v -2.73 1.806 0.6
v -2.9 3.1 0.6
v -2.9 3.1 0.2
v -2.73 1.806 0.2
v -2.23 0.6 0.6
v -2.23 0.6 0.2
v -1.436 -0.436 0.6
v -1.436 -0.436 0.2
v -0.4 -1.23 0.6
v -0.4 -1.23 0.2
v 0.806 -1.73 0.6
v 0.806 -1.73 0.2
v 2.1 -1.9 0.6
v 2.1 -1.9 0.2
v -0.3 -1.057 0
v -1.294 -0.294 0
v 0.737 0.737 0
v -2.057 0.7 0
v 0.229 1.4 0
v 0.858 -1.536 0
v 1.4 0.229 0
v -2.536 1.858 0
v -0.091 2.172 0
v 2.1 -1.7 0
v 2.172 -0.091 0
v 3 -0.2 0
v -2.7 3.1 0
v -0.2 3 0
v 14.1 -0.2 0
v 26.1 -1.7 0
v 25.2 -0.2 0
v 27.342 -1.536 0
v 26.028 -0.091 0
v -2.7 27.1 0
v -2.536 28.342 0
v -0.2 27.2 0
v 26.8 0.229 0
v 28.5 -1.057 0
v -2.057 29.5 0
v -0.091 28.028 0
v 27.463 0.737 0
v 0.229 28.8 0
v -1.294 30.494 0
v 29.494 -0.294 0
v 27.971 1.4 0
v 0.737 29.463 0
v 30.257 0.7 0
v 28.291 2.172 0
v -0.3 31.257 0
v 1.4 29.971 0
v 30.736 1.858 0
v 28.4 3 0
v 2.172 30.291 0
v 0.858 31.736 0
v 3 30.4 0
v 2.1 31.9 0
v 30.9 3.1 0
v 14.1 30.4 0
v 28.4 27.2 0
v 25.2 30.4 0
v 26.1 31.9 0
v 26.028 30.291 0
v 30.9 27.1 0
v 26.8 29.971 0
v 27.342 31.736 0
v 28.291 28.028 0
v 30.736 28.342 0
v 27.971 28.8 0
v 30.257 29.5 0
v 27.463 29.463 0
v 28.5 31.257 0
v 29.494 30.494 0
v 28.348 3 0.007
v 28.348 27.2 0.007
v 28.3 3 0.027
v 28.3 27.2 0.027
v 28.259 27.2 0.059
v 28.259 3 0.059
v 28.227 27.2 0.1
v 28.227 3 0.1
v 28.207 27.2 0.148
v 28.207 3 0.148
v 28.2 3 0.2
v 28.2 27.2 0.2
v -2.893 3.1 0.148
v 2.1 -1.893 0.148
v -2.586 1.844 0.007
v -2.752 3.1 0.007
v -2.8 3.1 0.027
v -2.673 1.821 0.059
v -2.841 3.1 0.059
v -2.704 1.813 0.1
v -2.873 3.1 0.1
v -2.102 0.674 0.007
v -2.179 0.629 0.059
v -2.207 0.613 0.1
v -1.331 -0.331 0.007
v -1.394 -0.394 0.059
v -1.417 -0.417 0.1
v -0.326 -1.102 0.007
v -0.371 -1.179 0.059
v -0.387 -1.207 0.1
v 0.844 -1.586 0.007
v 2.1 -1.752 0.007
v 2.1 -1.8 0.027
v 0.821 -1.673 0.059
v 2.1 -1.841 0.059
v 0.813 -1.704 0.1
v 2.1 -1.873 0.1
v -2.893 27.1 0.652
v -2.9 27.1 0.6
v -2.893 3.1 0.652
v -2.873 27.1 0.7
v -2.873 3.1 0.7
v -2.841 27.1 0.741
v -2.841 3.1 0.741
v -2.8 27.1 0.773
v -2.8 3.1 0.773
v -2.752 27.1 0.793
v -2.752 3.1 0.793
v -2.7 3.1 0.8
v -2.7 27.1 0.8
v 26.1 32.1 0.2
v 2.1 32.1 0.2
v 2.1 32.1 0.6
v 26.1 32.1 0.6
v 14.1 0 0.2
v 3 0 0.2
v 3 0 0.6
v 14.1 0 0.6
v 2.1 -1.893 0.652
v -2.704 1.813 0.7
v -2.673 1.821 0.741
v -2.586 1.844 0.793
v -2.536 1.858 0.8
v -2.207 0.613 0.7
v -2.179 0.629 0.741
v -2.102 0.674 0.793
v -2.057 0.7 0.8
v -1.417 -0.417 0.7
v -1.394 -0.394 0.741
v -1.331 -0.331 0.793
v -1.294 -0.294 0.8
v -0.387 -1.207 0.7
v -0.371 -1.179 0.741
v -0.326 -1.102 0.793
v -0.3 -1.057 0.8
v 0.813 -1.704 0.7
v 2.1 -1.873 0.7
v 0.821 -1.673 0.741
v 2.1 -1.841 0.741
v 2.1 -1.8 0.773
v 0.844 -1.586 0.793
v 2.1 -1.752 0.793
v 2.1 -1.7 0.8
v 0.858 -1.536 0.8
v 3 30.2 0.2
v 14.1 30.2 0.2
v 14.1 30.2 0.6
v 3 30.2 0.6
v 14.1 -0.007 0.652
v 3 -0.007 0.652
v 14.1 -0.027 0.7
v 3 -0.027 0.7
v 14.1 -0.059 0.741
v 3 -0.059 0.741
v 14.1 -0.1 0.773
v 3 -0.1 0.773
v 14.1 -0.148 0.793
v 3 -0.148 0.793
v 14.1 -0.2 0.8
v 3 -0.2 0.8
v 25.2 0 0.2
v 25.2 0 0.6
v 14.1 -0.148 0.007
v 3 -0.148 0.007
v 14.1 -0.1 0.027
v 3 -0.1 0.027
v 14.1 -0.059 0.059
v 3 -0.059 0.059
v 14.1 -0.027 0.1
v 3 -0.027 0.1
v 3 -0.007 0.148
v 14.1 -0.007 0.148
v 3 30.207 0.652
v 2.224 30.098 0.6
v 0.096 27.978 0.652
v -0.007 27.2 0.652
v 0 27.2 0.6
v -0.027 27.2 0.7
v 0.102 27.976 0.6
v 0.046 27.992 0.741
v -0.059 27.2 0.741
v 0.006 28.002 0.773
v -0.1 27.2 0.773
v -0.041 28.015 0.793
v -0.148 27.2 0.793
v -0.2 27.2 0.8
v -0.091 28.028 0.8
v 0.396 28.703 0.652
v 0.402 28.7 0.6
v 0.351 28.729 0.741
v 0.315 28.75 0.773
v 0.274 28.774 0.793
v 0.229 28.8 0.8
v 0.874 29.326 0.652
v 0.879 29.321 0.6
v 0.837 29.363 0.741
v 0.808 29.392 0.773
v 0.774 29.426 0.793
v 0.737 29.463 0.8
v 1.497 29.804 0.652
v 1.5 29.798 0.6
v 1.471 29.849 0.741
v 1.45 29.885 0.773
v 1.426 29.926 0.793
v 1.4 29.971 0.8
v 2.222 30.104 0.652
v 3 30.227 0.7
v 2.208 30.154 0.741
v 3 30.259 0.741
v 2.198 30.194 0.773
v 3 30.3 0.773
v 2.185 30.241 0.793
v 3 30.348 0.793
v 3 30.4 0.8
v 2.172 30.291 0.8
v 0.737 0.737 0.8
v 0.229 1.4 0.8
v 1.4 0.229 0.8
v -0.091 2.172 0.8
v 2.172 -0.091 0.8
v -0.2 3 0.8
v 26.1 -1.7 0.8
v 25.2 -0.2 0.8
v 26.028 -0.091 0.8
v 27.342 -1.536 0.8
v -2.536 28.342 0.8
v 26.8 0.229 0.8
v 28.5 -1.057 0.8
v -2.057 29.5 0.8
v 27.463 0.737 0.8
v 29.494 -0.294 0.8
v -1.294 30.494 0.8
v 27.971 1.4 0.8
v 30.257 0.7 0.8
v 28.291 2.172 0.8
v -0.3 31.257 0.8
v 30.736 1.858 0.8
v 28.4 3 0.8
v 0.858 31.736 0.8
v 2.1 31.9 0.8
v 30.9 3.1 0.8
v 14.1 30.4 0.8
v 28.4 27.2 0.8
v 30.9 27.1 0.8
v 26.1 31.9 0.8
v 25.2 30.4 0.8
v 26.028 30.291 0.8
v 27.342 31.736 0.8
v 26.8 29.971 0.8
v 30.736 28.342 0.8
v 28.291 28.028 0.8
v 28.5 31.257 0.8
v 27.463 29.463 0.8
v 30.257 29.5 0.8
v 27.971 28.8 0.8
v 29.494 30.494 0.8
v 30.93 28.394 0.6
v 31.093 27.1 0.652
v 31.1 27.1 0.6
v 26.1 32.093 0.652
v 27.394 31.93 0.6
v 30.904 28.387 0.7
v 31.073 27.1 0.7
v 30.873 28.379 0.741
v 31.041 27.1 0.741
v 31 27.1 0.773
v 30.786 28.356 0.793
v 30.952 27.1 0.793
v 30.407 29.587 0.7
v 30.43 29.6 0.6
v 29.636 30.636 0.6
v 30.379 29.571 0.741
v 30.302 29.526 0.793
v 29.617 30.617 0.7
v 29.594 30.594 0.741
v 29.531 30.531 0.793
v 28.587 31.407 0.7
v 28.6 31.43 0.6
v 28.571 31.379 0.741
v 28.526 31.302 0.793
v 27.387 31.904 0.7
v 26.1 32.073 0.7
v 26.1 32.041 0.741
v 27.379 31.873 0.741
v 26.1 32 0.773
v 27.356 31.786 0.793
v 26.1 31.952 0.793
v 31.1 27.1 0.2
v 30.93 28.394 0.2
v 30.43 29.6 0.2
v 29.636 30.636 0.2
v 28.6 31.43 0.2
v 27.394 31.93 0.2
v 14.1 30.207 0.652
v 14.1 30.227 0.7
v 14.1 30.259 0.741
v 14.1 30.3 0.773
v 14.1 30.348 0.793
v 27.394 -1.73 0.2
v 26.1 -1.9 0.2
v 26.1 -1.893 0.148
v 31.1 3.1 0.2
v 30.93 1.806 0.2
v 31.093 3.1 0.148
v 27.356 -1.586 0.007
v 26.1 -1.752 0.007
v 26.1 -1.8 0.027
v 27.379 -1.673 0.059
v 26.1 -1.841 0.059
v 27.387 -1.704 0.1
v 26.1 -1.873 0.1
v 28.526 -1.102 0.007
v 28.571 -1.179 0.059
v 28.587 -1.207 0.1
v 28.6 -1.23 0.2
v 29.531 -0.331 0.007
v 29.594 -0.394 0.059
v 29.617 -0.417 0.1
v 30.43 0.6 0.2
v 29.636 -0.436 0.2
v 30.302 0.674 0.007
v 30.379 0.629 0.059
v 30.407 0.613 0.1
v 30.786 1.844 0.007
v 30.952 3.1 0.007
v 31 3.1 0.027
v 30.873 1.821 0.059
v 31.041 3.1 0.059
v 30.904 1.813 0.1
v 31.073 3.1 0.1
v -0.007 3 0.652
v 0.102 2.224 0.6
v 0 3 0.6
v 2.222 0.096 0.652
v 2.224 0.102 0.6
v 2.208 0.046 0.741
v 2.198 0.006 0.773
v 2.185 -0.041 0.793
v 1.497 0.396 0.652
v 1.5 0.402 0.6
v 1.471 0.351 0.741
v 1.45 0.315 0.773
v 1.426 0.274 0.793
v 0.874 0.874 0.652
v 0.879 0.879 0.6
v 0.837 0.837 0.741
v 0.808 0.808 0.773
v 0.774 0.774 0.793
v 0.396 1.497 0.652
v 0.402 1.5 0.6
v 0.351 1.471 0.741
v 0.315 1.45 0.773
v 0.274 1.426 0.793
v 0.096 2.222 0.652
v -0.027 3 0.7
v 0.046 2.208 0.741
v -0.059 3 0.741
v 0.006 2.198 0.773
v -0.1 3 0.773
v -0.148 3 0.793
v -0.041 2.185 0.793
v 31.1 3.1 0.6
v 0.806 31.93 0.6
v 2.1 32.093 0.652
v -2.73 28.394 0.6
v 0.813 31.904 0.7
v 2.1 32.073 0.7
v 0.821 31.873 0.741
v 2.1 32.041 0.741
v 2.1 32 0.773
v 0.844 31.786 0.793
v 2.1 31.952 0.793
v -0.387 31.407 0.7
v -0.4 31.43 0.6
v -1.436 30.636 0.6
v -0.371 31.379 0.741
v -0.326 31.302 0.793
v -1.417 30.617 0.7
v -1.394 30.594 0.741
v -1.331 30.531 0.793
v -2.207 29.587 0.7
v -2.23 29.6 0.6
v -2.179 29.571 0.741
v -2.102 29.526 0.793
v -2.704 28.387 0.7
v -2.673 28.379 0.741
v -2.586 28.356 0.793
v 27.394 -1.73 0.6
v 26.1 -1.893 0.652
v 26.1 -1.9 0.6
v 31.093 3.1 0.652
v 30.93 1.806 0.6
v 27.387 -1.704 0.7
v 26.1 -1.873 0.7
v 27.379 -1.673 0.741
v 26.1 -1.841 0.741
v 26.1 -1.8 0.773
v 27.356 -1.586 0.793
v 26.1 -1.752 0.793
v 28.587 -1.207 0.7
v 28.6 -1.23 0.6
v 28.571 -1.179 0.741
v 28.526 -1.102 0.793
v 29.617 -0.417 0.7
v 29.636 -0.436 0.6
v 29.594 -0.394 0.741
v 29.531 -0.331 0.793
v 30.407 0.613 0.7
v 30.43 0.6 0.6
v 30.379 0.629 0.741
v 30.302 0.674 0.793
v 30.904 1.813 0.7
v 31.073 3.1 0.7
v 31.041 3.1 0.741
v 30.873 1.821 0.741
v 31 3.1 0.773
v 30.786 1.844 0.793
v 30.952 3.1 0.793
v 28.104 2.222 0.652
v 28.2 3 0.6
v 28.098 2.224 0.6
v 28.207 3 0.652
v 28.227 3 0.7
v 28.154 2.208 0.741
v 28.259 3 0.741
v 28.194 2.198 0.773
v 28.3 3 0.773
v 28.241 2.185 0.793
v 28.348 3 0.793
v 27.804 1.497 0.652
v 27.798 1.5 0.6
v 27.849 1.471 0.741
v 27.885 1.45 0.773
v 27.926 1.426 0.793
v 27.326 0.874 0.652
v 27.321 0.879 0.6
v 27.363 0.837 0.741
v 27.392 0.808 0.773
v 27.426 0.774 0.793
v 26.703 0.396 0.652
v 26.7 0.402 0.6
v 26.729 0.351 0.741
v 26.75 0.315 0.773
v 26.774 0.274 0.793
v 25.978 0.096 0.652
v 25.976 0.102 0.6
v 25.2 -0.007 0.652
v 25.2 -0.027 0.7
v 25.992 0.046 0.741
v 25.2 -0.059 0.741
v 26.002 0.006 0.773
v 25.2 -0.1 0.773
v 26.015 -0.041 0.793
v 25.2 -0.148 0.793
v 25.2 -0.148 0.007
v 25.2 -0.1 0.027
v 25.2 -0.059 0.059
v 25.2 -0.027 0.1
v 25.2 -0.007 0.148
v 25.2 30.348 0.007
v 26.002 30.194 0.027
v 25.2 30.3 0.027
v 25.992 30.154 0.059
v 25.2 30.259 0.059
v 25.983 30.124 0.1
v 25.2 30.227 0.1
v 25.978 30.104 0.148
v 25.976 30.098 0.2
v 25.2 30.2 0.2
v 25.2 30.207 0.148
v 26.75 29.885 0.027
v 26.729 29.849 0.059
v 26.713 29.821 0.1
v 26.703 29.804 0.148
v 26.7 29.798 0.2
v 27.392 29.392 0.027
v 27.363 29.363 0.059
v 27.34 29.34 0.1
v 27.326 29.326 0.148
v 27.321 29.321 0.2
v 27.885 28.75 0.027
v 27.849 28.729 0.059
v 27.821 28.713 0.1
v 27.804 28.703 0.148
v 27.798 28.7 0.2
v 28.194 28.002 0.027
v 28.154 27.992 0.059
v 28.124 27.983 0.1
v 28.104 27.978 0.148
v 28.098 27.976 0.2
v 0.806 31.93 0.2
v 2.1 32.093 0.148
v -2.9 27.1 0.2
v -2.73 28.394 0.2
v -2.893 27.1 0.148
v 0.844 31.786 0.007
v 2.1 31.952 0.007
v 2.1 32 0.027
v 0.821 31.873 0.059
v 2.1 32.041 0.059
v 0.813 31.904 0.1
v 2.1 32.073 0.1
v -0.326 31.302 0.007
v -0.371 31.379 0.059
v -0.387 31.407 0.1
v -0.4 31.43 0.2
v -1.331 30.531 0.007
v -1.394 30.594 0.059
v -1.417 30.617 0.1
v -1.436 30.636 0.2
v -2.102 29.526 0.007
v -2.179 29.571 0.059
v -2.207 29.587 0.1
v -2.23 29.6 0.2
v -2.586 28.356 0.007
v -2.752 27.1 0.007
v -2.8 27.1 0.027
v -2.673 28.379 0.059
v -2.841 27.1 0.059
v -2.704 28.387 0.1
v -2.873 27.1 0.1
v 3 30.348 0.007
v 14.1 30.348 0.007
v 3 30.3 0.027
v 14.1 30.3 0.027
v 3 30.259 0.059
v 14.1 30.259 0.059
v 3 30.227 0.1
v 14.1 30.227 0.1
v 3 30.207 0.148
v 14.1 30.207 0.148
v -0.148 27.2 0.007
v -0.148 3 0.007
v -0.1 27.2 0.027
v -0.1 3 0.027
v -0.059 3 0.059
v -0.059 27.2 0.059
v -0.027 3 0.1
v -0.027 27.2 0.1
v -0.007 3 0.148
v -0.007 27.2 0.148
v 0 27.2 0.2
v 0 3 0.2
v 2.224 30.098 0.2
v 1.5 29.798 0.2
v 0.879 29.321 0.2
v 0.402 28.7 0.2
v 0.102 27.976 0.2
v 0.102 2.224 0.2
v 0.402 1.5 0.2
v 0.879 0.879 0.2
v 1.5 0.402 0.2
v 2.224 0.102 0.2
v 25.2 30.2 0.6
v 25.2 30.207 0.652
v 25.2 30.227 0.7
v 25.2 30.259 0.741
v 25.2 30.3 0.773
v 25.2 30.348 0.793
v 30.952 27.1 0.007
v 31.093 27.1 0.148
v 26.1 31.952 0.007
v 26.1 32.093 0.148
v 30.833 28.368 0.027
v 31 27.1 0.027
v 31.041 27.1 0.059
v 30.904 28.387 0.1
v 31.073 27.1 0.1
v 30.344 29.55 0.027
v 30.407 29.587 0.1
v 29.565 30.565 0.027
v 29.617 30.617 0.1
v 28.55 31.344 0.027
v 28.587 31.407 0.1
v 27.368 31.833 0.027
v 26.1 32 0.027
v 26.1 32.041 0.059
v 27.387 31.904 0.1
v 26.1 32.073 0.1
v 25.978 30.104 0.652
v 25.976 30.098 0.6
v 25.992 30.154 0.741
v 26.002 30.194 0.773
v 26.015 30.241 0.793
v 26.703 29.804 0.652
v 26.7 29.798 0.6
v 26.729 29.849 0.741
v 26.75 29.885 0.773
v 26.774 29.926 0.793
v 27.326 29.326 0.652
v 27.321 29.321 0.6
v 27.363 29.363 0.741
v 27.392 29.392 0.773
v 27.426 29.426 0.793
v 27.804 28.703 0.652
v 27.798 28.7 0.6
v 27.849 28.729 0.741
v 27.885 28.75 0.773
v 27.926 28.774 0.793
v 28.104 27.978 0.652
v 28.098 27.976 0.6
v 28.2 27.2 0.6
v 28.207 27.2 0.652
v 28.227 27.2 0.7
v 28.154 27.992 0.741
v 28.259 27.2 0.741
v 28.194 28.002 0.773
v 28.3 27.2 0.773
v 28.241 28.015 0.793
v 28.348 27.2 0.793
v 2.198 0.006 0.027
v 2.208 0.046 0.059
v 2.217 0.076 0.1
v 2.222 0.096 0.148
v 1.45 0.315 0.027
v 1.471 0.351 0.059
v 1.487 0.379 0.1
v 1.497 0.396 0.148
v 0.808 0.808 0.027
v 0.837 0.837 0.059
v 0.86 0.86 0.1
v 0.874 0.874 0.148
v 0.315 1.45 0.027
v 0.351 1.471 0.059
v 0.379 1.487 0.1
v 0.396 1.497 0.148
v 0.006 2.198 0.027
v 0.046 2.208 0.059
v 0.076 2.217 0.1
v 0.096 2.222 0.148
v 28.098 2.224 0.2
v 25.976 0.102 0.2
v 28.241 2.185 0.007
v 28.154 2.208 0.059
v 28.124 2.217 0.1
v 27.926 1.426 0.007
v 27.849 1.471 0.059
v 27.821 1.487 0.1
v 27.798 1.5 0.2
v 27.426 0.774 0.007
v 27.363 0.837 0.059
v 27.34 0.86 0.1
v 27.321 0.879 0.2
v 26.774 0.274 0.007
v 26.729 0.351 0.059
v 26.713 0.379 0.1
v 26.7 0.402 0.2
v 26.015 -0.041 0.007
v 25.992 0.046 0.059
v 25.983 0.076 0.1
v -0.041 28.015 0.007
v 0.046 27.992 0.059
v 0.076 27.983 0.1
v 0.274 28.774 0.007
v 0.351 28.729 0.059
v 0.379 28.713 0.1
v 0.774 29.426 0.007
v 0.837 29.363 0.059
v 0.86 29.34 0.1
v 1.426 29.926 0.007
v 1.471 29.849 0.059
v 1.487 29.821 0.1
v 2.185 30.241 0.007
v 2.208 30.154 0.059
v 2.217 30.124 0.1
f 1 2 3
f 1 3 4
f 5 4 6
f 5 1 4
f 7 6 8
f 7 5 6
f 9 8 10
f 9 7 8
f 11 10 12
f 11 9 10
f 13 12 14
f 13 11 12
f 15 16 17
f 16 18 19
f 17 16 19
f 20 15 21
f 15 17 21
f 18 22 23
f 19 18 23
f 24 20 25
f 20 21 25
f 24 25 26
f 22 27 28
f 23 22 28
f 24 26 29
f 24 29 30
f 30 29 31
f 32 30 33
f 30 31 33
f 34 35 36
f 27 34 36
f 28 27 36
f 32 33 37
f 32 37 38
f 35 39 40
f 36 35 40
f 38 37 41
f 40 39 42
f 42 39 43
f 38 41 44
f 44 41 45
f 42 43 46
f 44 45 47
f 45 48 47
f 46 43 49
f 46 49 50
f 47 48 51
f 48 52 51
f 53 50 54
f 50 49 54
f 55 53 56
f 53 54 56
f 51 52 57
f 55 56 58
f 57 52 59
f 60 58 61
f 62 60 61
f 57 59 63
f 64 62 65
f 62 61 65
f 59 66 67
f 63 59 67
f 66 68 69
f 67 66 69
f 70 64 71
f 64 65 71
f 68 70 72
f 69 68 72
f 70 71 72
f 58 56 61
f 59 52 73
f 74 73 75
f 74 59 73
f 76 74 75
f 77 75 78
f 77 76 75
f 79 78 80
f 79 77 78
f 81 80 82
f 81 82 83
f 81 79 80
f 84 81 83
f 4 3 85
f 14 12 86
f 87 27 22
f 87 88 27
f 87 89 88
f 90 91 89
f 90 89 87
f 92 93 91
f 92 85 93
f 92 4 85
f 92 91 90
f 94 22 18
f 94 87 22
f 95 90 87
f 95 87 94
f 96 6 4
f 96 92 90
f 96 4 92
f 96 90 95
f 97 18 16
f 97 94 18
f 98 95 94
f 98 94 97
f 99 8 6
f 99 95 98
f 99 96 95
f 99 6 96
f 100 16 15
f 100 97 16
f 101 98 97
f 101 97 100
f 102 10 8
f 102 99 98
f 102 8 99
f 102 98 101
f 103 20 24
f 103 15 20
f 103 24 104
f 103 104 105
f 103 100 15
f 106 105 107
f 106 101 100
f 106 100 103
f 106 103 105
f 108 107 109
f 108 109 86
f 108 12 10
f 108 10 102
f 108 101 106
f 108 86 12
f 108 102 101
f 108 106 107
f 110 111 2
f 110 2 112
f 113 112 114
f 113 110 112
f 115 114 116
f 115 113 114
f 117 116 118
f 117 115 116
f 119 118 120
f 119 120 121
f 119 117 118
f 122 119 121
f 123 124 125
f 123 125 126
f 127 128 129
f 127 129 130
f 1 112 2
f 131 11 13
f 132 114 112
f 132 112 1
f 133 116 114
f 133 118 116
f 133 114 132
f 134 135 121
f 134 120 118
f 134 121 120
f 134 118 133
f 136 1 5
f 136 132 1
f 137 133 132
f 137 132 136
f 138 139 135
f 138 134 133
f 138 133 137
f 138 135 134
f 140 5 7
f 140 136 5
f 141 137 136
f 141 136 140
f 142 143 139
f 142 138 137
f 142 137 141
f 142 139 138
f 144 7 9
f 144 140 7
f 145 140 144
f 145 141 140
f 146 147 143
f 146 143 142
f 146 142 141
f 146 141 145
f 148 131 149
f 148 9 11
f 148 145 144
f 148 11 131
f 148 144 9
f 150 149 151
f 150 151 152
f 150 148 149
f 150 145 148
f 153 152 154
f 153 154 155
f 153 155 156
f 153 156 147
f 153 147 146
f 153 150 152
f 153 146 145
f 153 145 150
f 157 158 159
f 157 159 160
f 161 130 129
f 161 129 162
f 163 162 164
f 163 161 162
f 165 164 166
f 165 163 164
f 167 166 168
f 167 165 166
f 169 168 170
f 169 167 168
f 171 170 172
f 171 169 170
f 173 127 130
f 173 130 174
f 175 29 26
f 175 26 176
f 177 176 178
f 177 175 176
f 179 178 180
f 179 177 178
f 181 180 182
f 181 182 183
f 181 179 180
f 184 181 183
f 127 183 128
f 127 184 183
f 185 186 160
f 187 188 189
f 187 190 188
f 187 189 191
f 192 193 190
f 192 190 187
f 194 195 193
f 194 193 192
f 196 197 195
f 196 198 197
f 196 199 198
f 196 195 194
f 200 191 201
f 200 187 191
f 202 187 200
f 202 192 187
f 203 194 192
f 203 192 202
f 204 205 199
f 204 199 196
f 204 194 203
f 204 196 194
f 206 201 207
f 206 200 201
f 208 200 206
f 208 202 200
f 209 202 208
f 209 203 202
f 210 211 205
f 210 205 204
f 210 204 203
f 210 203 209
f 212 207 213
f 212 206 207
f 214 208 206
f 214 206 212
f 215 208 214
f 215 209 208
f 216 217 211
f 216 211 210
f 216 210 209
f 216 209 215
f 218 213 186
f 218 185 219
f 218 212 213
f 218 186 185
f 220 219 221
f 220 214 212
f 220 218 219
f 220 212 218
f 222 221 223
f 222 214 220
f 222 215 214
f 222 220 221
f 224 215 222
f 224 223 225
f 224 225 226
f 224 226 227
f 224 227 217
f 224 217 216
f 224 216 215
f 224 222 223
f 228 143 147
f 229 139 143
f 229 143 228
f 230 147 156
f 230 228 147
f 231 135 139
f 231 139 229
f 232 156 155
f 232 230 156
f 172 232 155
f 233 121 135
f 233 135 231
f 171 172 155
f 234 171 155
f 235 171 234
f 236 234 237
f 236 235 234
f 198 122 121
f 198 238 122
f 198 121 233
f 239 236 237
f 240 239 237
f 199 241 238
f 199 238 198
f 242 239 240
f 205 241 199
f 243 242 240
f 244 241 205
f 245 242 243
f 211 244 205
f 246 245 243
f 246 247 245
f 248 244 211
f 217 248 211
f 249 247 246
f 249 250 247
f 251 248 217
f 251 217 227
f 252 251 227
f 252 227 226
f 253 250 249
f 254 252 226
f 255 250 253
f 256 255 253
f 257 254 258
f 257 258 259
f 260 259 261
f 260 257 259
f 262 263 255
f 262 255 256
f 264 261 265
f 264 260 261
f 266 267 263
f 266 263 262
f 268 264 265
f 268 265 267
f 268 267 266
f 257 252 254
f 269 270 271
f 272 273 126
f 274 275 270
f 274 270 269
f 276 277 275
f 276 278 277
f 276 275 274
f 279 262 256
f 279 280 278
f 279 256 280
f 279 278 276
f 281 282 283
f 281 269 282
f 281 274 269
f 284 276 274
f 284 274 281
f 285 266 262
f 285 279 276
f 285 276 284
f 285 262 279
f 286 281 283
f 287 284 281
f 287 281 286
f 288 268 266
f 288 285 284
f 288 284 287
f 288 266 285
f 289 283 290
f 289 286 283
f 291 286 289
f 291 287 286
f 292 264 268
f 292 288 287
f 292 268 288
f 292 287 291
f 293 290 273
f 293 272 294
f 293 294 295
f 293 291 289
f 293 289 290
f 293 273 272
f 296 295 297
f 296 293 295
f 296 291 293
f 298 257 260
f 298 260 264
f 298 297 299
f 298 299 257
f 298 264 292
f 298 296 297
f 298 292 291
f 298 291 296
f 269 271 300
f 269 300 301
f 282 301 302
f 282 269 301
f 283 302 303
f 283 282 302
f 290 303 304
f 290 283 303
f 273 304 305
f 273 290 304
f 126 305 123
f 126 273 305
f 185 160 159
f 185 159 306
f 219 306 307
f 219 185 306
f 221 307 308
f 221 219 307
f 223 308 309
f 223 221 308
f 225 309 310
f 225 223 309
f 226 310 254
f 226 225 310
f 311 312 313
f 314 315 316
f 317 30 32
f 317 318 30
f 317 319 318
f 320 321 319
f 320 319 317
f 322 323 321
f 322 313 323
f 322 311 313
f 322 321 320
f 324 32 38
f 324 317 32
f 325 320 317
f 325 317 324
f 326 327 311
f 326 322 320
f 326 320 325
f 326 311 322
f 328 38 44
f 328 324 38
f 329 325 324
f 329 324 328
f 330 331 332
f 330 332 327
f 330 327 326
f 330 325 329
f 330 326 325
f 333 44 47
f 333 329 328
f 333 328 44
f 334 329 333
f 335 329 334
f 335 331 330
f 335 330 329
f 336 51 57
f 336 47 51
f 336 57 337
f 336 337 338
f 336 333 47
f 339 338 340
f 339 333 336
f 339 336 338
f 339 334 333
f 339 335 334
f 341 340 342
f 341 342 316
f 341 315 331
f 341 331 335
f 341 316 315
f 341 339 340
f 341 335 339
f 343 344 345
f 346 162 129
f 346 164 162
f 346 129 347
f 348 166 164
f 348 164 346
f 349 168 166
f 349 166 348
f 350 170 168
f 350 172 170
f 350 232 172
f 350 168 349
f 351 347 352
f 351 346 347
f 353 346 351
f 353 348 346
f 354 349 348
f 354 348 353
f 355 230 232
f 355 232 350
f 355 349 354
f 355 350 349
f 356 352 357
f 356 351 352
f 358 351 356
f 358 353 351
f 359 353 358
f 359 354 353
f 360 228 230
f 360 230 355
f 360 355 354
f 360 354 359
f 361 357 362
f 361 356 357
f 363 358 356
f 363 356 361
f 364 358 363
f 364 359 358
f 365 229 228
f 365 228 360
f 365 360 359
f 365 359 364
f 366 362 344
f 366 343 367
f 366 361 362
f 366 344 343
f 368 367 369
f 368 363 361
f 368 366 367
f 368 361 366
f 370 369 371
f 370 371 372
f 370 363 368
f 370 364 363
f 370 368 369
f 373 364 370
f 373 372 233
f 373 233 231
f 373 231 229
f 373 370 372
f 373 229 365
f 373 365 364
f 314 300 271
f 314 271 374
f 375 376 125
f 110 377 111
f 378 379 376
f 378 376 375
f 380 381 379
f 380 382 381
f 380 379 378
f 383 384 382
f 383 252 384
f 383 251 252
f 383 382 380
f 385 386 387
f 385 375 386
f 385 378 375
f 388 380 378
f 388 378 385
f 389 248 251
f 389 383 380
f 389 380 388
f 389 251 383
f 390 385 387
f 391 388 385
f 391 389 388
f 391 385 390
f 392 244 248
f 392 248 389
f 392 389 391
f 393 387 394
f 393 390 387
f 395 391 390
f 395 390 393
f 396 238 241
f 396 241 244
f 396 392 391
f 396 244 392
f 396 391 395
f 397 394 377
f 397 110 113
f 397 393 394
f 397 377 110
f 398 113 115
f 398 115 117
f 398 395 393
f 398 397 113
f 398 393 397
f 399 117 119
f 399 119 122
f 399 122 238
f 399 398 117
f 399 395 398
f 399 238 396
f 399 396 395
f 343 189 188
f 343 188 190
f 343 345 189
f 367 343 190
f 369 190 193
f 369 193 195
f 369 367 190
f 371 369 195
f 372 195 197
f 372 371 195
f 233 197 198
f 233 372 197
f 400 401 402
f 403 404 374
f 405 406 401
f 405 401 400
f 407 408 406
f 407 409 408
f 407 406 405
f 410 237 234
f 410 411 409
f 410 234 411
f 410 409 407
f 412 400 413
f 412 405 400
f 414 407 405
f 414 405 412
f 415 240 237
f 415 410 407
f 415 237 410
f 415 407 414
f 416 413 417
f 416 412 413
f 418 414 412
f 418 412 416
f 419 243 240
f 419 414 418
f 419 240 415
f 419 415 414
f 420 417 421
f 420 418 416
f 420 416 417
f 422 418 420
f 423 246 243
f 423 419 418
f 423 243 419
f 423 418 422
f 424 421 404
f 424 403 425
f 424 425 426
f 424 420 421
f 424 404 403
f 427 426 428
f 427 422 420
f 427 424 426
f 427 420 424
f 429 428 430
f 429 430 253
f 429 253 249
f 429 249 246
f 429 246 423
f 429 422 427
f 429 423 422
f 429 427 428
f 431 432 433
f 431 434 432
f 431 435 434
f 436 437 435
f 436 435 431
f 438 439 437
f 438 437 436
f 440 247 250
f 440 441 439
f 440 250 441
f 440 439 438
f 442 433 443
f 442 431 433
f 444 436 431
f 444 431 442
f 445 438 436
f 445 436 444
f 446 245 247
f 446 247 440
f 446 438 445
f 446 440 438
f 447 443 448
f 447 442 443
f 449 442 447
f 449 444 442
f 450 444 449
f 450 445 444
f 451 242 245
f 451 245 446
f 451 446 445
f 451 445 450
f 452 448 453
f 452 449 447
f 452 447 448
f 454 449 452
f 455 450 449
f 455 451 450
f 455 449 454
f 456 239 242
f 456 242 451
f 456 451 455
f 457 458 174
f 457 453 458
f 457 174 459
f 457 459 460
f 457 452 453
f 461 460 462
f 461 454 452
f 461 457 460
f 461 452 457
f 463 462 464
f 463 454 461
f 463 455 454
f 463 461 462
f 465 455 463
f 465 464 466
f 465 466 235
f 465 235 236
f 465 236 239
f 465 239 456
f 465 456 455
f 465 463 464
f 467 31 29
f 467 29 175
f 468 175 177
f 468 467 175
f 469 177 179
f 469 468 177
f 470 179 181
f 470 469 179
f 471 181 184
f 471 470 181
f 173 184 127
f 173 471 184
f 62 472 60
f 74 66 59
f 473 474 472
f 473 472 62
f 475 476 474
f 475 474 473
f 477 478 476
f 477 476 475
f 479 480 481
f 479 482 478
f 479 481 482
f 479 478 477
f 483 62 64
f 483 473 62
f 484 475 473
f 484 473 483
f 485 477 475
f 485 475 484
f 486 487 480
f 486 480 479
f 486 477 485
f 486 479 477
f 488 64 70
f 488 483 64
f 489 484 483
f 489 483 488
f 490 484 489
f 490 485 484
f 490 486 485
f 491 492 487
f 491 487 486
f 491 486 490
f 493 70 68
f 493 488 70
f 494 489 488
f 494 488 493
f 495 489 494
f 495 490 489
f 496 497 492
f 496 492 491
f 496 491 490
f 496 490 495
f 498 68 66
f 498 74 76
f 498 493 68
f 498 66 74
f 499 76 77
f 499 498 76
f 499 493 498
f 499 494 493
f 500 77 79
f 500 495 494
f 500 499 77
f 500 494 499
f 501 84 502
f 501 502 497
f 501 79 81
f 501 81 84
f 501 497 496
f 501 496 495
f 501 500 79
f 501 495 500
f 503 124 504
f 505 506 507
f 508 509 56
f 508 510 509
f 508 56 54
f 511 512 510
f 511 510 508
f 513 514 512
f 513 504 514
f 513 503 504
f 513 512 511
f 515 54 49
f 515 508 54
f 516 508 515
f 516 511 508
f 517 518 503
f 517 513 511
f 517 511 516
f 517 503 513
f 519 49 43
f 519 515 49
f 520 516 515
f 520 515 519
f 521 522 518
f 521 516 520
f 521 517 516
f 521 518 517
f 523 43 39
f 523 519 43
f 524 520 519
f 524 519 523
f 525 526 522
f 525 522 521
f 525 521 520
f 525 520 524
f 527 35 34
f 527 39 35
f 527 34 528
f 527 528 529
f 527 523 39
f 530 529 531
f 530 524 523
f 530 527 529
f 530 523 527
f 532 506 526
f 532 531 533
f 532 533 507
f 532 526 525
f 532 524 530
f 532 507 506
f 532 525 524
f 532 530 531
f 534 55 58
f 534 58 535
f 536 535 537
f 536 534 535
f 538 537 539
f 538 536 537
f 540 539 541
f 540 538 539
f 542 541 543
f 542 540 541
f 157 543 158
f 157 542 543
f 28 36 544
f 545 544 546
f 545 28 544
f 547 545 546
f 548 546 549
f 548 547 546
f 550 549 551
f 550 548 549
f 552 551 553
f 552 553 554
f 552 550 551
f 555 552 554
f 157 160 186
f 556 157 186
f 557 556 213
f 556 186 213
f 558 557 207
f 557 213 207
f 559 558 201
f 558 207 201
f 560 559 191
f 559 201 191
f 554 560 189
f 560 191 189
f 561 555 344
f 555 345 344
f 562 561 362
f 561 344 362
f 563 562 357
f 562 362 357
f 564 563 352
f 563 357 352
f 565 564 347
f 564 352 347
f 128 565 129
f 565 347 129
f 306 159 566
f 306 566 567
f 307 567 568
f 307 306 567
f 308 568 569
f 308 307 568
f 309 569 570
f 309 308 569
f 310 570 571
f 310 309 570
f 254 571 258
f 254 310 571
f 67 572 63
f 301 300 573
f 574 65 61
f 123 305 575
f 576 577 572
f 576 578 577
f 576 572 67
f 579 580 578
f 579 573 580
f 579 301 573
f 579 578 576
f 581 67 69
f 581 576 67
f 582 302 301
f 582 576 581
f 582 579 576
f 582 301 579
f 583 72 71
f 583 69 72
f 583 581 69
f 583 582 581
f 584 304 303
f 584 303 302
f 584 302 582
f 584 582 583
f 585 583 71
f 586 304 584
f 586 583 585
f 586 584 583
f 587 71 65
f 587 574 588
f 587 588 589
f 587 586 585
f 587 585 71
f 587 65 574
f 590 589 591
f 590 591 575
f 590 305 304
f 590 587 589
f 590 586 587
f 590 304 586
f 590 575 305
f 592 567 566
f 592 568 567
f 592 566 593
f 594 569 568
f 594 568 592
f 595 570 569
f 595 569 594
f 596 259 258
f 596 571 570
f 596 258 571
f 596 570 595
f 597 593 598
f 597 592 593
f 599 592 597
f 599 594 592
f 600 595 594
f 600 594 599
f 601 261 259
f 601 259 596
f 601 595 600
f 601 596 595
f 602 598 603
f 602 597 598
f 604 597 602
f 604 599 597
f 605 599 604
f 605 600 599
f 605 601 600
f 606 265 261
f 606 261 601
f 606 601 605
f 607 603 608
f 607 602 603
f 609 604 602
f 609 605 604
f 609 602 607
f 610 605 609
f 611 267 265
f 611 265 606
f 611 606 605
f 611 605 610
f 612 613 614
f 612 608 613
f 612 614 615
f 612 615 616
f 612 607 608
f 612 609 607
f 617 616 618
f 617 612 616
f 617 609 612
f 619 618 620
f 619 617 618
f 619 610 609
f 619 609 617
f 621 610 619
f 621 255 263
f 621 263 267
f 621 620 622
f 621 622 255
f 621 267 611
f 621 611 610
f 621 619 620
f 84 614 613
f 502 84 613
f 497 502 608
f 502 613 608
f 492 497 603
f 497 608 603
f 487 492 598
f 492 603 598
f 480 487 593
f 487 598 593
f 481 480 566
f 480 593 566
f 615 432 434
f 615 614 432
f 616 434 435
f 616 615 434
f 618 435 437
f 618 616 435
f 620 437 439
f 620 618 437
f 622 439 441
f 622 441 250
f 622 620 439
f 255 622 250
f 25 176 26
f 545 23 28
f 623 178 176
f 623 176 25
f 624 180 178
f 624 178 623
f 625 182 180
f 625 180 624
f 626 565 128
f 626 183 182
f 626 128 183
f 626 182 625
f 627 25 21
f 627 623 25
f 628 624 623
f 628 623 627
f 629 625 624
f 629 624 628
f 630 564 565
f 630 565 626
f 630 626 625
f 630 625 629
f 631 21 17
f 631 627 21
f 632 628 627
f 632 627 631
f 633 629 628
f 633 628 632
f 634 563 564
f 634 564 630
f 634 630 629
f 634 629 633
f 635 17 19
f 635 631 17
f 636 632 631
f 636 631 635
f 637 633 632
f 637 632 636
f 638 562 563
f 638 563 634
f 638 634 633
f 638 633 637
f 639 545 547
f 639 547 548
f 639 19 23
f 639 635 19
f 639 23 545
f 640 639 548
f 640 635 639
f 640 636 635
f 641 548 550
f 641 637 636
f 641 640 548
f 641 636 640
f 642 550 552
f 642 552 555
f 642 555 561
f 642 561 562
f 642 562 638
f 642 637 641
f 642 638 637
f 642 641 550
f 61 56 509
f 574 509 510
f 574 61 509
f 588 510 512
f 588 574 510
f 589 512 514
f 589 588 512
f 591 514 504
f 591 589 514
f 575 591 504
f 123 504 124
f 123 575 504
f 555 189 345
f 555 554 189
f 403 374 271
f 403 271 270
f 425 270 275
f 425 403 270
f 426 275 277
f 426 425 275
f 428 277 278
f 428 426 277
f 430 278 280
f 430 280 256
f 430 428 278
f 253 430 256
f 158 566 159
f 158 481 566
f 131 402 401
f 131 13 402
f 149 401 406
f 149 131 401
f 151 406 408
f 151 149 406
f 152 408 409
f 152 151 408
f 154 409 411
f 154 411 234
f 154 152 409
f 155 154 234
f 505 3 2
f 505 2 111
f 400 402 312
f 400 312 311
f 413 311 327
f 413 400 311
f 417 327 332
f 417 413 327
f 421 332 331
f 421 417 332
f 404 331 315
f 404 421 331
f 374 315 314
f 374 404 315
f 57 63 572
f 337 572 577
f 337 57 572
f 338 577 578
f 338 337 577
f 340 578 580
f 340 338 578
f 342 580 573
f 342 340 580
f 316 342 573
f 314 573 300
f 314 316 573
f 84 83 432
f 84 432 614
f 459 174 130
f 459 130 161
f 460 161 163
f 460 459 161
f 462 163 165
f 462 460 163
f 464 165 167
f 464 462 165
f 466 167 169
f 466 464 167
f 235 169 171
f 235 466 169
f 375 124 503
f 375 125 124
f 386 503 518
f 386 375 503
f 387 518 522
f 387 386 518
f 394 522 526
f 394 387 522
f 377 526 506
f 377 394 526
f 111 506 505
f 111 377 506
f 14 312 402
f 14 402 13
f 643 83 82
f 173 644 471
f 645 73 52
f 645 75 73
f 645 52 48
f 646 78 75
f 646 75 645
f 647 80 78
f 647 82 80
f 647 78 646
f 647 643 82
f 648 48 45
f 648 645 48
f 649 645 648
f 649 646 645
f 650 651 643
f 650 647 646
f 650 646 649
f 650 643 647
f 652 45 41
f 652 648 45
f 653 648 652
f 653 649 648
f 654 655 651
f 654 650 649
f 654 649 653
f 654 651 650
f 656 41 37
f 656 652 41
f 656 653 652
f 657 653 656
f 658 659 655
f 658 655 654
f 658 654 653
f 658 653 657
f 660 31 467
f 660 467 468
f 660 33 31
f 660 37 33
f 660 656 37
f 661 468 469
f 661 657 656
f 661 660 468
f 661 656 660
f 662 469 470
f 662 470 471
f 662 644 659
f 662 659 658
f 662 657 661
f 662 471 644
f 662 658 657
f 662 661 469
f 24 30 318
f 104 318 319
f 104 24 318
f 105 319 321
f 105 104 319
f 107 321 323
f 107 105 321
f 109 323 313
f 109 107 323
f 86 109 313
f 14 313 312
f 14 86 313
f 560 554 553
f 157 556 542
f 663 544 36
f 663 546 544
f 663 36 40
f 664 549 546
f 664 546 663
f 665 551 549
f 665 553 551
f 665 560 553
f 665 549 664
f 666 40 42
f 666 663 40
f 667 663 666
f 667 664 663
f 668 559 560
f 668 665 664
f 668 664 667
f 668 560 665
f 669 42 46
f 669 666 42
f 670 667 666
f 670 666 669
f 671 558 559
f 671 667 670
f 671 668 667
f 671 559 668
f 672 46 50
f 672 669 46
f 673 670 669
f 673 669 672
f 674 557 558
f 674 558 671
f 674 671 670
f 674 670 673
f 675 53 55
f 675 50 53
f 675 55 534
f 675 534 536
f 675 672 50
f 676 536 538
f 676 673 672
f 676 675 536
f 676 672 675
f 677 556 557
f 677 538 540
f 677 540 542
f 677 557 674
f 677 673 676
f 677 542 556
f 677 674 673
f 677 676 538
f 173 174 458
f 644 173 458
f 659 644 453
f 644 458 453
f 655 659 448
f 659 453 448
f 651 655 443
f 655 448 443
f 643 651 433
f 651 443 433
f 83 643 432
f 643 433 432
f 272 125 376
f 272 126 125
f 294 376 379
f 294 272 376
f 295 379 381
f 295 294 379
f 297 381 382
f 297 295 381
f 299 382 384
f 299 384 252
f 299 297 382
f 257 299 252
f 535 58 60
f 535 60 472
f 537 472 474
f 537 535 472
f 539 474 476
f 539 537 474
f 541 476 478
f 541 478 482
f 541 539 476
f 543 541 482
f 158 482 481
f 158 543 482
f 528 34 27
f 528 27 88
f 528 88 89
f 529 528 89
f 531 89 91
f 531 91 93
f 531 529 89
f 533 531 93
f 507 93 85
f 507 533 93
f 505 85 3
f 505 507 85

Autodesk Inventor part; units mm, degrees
ref_plane "YZ Plane" through (0, 0, 0) normal (1, 0, 0) x (0, 1, 0)
ref_plane "XZ Plane" through (0, 0, 0) normal (0, 1, 0) x (-1, 0, 0)
ref_plane "XY Plane" through (0, 0, 0) normal (0, 0, 1) x (1, 0, 0)
sketch "Sketch1" plane through (0, 0, 0) normal (0, 0, 1) x (1, 0, 0)
  line L0 (0, 0) -> (28.2, 0)
  line L1 (28.2, 0) -> (28.2, 30.2)
  line L2 (28.2, 30.2) -> (0, 30.2)
  line L3 (0, 30.2) -> (0, 0)
  line L4 (14.1, 30.2) -> (14.1, 0)
  line L5 (31.1, -1.9) -> (-2.9, -1.9)
  line L6 (-2.9, -1.9) -> (-2.9, 32.1)
  line L7 (-2.9, 32.1) -> (31.1, 32.1)
  line L8 (31.1, 32.1) -> (31.1, -1.9)
  line L9 (31.1, -1.9) -> (-2.9, 32.1) construction
  line L10 (-2.9, -1.9) -> (31.1, 32.1) construction
  point P0 (14.1, 15.1)
  dimension "d0" = 30.2
  dimension "d1" = 28.2
  dimension "d2" = 34
  dimension "d3" = 34
extrude "Extrusion1" add sketch "Sketch1" along normal blind 0.8
fillet "Fillet1" radius 3 4 edges at (0, 0, 0.4) (0, 30.2, 0.4) (28.2, 30.2, 0.4) (28.2, 0, 0.4)
fillet "Fillet2" radius 5 4 edges at (31.1, 32.1, 0.4) (-2.9, 32.1, 0.4) (31.1, -1.9, 0.4) (-2.9, -1.9, 0.4)
fillet "Fillet3" radius 0.2 24 edges at (-1.4355, 30.6355, 0) (-2.9, 15.1, 0) (-1.4355, -0.4355, 0) (14.1, -1.9, 0) (29.6355, -0.4355, 0) (31.1, 15.1, 0) (29.6355, 30.6355, 0) (14.1, 32.1, 0) (14.1, 32.1, 0.8) (29.6355, 30.6355, 0.8) (31.1, 15.1, 0.8) (29.6355, -0.4355, 0.8) (14.1, -1.9, 0.8) (-1.4355, -0.4355, 0.8) (-2.9, 15.1, 0.8) (-1.4355, 30.6355, 0.8) (0, 15.1, 0.8) (14.1, 0, 0.8) (28.2, 15.1, 0.8) (14.1, 30.2, 0.8) (14.1, 30.2, 0) (28.2, 15.1, 0) (14.1, 0, 0) (0, 15.1, 0)
properties part number "LeptonBlockSpacer"
